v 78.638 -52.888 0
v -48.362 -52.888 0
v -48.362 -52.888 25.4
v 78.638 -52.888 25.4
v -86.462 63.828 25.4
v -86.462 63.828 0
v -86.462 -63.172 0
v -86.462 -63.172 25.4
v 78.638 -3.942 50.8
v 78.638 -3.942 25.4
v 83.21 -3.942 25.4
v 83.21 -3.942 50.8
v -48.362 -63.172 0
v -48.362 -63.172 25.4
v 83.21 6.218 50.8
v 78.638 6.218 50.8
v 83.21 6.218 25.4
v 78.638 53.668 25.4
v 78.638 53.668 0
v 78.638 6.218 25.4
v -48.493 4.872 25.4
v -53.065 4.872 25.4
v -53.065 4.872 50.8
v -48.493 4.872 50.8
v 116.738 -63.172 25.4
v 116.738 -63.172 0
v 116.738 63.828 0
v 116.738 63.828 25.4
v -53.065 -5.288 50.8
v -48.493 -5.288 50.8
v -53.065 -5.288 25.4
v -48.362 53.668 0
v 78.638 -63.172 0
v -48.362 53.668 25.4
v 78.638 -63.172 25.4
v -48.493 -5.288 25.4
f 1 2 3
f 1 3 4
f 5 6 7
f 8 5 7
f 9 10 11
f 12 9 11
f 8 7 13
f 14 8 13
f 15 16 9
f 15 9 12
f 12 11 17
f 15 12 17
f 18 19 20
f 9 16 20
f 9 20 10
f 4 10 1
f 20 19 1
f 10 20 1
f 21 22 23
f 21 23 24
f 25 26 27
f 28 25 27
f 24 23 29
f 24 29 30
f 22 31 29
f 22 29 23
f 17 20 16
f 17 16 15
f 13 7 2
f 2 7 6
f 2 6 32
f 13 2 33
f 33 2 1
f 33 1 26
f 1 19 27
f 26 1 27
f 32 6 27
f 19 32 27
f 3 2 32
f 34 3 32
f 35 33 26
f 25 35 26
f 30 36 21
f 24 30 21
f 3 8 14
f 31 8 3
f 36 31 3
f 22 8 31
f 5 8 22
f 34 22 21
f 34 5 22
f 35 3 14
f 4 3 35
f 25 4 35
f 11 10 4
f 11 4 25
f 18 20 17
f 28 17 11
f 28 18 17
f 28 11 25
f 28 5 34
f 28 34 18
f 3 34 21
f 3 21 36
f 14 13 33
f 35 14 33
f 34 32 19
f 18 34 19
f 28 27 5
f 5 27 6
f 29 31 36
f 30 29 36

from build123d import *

# Parameters (mm, degrees)
F0_W     = 127
F0_H     = 10.16
F0_H_2   = 10.284107
F1_DEPTH = 25.4
F2_W     = 4.572
F2_H     = 10.16
F3_DEPTH = 50.8
F4_W     = 4.572
F4_H     = 10.16
F5_DEPTH = 25.4


with BuildPart() as f1:
    # F0 (on Top) → F1 (new body)
    with BuildSketch(Plane.XY):
        Polygon((116.738255, 63.828293), (78.638255, 63.828293), (78.638255, 53.668293), (78.638255, -52.8876), (78.638255, -63.171707), (116.738255, -63.171707), align=None)
        with Locations((15.138255, 58.748293)):
            Rectangle(F0_W, F0_H)
        Polygon((-48.361745, 53.668293), (-48.361745, 63.828293), (-86.461745, 63.828293), (-86.461745, -63.171707), (-48.361745, -63.171707), (-48.361745, -52.8876), align=None)
        with Locations((15.138255, -58.029653)):
            Rectangle(F0_W, F0_H_2)
    extrude(amount=F1_DEPTH)

    # F2 (on Top) → F3 (join)
    with BuildSketch(Plane.XY):
        with Locations((-50.779041, -0.207529)):
            Rectangle(F2_W, F2_H)
    extrude(amount=F3_DEPTH)

    # F4 (on face) → F5 (join)
    with BuildSketch(Plane.XY.offset(25.4)):
        with Locations((80.924255, 1.138359)):
            Rectangle(F4_W, F4_H)
    extrude(amount=F5_DEPTH)


solid = f1.part
